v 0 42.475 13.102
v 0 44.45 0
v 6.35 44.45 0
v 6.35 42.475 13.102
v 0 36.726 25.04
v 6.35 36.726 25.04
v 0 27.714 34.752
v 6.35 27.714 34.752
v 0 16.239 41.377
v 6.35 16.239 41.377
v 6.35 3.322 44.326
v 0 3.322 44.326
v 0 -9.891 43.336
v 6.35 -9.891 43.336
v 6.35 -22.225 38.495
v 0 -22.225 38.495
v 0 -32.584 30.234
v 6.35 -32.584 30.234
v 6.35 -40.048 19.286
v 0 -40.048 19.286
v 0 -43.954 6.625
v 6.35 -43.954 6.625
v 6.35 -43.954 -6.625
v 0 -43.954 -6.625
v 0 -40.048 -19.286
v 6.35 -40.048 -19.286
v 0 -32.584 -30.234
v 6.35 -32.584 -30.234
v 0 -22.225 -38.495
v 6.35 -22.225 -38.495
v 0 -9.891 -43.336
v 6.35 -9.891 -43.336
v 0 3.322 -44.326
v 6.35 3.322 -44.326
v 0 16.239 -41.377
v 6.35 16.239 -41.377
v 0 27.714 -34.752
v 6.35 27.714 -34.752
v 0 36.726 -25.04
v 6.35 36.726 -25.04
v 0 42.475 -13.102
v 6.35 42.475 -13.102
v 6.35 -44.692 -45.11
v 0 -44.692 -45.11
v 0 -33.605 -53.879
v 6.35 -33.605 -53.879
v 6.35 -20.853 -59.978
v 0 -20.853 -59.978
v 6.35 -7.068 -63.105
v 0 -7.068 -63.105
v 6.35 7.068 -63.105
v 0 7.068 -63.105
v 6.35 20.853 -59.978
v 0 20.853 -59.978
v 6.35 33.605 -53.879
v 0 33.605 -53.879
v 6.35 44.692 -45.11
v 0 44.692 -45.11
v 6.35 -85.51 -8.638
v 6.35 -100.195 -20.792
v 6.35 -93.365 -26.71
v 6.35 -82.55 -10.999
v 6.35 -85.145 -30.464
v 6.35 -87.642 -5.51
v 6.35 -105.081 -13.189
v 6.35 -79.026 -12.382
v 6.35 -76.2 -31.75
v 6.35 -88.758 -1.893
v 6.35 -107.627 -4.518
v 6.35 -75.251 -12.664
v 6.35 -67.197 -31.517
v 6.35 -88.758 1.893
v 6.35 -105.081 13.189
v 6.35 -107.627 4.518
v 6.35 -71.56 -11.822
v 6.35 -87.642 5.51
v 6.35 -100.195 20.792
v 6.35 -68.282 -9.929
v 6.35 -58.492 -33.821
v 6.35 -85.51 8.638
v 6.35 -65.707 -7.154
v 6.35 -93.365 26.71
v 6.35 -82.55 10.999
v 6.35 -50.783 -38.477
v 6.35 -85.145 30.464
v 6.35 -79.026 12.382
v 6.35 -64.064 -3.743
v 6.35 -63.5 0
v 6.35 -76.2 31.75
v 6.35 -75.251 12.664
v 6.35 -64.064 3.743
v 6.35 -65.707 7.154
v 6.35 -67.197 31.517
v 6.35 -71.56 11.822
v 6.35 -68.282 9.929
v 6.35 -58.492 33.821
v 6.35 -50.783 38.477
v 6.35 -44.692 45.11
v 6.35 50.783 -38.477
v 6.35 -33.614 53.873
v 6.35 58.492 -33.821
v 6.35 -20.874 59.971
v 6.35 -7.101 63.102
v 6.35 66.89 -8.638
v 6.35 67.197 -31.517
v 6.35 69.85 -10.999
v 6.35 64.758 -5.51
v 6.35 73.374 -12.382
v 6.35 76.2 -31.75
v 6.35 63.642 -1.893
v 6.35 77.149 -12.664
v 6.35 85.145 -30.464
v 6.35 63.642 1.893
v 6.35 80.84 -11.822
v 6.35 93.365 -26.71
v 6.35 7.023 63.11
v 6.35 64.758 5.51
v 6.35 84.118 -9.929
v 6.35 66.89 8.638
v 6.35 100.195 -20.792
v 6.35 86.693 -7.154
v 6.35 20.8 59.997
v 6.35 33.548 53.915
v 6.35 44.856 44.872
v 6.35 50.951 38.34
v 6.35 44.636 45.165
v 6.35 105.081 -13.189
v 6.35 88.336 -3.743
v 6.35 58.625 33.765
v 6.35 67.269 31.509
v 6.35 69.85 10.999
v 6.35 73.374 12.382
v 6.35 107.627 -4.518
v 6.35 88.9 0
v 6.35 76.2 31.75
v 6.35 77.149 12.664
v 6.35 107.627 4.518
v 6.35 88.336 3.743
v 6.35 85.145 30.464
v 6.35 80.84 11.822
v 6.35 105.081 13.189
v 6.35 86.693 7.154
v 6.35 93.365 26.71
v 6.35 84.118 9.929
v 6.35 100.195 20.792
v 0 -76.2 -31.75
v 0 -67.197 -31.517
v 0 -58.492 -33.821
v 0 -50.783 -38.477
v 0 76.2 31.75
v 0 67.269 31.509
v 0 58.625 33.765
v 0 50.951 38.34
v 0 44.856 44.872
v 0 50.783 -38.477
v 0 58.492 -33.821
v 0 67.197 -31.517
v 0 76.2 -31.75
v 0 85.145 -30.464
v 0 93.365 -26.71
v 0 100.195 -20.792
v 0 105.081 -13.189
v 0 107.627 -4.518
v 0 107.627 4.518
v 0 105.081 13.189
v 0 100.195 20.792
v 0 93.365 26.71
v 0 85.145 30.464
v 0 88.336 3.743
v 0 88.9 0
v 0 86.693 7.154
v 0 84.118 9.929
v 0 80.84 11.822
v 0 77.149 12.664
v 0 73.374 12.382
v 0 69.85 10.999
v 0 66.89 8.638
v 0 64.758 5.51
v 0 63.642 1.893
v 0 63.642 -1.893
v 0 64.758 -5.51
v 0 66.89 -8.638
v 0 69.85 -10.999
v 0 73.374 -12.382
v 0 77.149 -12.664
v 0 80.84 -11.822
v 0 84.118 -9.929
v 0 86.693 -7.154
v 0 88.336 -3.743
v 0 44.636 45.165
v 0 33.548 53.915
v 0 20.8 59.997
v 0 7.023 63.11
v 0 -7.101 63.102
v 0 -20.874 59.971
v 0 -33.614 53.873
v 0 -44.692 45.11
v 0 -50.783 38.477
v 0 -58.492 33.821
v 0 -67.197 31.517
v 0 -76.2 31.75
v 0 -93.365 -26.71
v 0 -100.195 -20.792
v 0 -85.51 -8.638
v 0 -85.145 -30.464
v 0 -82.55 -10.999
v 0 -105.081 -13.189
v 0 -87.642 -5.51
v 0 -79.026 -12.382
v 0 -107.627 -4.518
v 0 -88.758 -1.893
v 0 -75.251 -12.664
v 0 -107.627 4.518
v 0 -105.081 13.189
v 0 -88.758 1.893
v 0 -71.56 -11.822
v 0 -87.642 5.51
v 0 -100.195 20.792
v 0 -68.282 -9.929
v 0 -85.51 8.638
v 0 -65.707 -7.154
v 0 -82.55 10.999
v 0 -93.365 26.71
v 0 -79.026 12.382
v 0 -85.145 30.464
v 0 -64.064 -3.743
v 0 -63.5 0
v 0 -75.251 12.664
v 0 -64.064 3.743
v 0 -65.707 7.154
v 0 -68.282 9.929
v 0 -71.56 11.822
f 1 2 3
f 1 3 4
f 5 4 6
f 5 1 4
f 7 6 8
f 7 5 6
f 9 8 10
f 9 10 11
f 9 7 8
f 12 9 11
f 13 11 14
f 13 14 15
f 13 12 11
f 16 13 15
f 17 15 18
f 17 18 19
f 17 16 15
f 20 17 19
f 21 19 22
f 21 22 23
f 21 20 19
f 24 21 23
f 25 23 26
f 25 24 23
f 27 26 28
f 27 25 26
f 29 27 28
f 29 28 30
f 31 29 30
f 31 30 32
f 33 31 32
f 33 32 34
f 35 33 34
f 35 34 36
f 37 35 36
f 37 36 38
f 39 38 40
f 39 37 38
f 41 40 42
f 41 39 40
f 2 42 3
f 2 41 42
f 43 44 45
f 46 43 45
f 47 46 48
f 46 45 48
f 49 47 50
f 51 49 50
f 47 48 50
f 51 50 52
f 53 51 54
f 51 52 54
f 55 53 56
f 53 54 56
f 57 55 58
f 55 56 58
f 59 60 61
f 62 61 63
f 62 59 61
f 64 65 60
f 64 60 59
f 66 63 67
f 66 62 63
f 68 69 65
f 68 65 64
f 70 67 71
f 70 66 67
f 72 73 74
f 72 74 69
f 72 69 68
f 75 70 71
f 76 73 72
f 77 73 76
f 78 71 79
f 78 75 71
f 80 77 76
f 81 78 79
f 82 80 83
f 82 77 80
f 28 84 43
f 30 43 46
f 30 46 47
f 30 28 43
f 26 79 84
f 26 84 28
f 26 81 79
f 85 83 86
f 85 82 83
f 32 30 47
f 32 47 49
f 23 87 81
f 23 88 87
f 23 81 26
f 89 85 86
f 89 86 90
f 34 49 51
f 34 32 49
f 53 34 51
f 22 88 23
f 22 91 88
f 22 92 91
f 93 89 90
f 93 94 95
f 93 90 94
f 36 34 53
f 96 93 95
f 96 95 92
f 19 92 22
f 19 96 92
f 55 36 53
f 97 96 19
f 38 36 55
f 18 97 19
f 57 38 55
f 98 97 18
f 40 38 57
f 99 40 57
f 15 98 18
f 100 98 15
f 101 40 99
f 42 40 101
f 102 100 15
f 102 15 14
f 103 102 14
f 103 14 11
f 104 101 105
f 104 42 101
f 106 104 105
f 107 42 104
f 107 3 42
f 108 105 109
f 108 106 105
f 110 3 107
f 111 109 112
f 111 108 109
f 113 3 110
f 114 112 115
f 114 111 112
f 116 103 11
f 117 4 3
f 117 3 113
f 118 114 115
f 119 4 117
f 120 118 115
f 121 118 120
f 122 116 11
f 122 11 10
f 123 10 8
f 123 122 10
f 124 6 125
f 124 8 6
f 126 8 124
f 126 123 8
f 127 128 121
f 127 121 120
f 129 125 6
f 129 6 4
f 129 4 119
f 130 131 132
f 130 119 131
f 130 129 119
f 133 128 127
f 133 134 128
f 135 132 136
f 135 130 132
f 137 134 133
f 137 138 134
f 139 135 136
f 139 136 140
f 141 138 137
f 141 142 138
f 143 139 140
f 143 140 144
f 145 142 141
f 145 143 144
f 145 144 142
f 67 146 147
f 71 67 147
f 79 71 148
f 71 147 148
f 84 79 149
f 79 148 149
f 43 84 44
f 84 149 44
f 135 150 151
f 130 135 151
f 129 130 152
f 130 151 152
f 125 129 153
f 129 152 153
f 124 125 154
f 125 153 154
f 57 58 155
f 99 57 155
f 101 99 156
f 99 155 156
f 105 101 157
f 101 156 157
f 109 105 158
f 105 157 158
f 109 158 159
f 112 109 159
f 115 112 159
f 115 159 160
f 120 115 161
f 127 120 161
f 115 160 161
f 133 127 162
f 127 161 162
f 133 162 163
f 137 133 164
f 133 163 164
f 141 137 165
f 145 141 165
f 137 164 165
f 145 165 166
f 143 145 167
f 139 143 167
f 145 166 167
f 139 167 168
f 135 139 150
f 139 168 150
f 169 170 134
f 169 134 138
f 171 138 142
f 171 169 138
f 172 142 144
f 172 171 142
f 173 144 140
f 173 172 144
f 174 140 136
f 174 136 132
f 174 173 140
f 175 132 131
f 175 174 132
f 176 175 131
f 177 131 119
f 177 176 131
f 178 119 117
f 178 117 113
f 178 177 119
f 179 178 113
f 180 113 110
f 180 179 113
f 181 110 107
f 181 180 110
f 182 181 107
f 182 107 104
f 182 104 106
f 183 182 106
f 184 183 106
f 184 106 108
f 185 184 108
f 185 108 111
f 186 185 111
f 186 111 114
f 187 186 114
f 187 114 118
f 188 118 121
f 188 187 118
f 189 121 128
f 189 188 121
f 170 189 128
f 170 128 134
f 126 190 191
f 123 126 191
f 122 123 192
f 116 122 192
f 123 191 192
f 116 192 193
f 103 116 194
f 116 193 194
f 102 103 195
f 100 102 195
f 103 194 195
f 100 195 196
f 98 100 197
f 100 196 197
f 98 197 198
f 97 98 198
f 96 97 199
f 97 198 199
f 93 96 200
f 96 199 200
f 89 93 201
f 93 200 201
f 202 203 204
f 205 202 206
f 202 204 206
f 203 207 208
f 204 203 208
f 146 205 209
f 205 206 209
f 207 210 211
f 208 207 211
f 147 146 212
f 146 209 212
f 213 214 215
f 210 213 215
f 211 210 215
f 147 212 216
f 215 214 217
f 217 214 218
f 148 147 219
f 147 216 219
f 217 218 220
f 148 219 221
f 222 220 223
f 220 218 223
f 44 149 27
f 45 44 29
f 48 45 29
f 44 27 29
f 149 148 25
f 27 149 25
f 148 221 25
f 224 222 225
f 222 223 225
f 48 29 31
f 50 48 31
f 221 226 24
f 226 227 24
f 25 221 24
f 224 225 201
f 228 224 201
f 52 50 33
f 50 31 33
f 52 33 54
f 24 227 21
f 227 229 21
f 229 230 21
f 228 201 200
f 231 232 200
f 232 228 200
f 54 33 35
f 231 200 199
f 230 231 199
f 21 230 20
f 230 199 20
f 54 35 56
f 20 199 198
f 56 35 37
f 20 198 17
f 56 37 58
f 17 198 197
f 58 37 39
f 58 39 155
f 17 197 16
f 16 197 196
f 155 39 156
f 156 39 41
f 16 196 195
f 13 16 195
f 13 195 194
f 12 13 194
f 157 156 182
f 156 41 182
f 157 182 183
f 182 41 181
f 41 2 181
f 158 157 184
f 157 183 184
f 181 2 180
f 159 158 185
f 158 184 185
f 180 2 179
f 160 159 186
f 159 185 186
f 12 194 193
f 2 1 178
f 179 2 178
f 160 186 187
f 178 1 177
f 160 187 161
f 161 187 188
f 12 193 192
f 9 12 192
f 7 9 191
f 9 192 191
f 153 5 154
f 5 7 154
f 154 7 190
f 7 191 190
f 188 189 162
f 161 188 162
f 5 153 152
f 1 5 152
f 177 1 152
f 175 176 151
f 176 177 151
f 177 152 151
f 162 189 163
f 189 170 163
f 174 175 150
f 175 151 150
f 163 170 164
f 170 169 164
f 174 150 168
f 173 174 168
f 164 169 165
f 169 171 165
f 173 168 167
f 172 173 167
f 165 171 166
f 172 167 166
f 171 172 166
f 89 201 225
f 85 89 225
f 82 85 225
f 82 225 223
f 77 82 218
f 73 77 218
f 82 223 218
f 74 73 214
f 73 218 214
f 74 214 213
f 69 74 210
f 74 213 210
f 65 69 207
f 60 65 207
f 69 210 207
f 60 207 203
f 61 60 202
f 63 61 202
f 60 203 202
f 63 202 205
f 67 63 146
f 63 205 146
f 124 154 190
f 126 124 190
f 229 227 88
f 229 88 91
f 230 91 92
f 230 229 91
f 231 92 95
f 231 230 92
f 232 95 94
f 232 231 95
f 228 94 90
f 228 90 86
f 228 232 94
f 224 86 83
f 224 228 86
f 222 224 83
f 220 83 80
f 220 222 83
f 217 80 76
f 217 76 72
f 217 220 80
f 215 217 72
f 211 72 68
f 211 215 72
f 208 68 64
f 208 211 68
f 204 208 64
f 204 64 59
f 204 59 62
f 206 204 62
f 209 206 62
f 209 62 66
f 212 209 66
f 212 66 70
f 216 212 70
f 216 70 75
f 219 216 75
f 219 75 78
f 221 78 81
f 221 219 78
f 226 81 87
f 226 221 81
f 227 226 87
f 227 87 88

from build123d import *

# Parameters (mm, degrees)
F0_R     = 12.7
F0_R_2   = 44.45
F1_DEPTH = 6.35


# Not quite as in the source:
# - a length typed as a fraction of an inch, garbled in the dataset ("3 / 203.2 mm" for 3/8 in), is restored


with BuildPart() as f1:
    # F0 (on Right) → F1 (new body)
    with BuildSketch(Plane.YZ):
        with BuildLine():
            Line((44.8562400312, 44.8719321083), (44.6357637569, 45.1652365635))
            ThreePointArc((44.6357637569, 45.1652365635), (-0.039236718, 63.4999878778), (-44.6915449582, 45.1100411133))
            ThreePointArc((-44.6915449582, 45.1100411133), (-58.4915893115, 33.8212553621), (-76.2, 31.75))
            ThreePointArc((-76.2, 31.75), (-107.95, 0), (-76.2, -31.75))
            ThreePointArc((-76.2, -31.75), (-58.4915893115, -33.8212553621), (-44.6915449582, -45.1100411133))
            ThreePointArc((-44.6915449582, -45.1100411133), (0, -63.5), (44.6915449582, -45.1100411133))
            ThreePointArc((44.6915449582, -45.1100411133), (58.4915893115, -33.8212553621), (76.2, -31.75))
            ThreePointArc((76.2, -31.75), (107.95, 0), (76.2, 31.75))
            ThreePointArc((76.2, 31.75), (58.6249913094, 33.7650494266), (44.8562400312, 44.8719321083))
        make_face()
        with Locations((-76.2, 0)):
            Circle(F0_R, mode=Mode.SUBTRACT)
        Circle(F0_R_2, mode=Mode.SUBTRACT)
        with Locations((76.2, 0)):
            Circle(F0_R, mode=Mode.SUBTRACT)
    extrude(amount=F1_DEPTH)


solid = f1.part
